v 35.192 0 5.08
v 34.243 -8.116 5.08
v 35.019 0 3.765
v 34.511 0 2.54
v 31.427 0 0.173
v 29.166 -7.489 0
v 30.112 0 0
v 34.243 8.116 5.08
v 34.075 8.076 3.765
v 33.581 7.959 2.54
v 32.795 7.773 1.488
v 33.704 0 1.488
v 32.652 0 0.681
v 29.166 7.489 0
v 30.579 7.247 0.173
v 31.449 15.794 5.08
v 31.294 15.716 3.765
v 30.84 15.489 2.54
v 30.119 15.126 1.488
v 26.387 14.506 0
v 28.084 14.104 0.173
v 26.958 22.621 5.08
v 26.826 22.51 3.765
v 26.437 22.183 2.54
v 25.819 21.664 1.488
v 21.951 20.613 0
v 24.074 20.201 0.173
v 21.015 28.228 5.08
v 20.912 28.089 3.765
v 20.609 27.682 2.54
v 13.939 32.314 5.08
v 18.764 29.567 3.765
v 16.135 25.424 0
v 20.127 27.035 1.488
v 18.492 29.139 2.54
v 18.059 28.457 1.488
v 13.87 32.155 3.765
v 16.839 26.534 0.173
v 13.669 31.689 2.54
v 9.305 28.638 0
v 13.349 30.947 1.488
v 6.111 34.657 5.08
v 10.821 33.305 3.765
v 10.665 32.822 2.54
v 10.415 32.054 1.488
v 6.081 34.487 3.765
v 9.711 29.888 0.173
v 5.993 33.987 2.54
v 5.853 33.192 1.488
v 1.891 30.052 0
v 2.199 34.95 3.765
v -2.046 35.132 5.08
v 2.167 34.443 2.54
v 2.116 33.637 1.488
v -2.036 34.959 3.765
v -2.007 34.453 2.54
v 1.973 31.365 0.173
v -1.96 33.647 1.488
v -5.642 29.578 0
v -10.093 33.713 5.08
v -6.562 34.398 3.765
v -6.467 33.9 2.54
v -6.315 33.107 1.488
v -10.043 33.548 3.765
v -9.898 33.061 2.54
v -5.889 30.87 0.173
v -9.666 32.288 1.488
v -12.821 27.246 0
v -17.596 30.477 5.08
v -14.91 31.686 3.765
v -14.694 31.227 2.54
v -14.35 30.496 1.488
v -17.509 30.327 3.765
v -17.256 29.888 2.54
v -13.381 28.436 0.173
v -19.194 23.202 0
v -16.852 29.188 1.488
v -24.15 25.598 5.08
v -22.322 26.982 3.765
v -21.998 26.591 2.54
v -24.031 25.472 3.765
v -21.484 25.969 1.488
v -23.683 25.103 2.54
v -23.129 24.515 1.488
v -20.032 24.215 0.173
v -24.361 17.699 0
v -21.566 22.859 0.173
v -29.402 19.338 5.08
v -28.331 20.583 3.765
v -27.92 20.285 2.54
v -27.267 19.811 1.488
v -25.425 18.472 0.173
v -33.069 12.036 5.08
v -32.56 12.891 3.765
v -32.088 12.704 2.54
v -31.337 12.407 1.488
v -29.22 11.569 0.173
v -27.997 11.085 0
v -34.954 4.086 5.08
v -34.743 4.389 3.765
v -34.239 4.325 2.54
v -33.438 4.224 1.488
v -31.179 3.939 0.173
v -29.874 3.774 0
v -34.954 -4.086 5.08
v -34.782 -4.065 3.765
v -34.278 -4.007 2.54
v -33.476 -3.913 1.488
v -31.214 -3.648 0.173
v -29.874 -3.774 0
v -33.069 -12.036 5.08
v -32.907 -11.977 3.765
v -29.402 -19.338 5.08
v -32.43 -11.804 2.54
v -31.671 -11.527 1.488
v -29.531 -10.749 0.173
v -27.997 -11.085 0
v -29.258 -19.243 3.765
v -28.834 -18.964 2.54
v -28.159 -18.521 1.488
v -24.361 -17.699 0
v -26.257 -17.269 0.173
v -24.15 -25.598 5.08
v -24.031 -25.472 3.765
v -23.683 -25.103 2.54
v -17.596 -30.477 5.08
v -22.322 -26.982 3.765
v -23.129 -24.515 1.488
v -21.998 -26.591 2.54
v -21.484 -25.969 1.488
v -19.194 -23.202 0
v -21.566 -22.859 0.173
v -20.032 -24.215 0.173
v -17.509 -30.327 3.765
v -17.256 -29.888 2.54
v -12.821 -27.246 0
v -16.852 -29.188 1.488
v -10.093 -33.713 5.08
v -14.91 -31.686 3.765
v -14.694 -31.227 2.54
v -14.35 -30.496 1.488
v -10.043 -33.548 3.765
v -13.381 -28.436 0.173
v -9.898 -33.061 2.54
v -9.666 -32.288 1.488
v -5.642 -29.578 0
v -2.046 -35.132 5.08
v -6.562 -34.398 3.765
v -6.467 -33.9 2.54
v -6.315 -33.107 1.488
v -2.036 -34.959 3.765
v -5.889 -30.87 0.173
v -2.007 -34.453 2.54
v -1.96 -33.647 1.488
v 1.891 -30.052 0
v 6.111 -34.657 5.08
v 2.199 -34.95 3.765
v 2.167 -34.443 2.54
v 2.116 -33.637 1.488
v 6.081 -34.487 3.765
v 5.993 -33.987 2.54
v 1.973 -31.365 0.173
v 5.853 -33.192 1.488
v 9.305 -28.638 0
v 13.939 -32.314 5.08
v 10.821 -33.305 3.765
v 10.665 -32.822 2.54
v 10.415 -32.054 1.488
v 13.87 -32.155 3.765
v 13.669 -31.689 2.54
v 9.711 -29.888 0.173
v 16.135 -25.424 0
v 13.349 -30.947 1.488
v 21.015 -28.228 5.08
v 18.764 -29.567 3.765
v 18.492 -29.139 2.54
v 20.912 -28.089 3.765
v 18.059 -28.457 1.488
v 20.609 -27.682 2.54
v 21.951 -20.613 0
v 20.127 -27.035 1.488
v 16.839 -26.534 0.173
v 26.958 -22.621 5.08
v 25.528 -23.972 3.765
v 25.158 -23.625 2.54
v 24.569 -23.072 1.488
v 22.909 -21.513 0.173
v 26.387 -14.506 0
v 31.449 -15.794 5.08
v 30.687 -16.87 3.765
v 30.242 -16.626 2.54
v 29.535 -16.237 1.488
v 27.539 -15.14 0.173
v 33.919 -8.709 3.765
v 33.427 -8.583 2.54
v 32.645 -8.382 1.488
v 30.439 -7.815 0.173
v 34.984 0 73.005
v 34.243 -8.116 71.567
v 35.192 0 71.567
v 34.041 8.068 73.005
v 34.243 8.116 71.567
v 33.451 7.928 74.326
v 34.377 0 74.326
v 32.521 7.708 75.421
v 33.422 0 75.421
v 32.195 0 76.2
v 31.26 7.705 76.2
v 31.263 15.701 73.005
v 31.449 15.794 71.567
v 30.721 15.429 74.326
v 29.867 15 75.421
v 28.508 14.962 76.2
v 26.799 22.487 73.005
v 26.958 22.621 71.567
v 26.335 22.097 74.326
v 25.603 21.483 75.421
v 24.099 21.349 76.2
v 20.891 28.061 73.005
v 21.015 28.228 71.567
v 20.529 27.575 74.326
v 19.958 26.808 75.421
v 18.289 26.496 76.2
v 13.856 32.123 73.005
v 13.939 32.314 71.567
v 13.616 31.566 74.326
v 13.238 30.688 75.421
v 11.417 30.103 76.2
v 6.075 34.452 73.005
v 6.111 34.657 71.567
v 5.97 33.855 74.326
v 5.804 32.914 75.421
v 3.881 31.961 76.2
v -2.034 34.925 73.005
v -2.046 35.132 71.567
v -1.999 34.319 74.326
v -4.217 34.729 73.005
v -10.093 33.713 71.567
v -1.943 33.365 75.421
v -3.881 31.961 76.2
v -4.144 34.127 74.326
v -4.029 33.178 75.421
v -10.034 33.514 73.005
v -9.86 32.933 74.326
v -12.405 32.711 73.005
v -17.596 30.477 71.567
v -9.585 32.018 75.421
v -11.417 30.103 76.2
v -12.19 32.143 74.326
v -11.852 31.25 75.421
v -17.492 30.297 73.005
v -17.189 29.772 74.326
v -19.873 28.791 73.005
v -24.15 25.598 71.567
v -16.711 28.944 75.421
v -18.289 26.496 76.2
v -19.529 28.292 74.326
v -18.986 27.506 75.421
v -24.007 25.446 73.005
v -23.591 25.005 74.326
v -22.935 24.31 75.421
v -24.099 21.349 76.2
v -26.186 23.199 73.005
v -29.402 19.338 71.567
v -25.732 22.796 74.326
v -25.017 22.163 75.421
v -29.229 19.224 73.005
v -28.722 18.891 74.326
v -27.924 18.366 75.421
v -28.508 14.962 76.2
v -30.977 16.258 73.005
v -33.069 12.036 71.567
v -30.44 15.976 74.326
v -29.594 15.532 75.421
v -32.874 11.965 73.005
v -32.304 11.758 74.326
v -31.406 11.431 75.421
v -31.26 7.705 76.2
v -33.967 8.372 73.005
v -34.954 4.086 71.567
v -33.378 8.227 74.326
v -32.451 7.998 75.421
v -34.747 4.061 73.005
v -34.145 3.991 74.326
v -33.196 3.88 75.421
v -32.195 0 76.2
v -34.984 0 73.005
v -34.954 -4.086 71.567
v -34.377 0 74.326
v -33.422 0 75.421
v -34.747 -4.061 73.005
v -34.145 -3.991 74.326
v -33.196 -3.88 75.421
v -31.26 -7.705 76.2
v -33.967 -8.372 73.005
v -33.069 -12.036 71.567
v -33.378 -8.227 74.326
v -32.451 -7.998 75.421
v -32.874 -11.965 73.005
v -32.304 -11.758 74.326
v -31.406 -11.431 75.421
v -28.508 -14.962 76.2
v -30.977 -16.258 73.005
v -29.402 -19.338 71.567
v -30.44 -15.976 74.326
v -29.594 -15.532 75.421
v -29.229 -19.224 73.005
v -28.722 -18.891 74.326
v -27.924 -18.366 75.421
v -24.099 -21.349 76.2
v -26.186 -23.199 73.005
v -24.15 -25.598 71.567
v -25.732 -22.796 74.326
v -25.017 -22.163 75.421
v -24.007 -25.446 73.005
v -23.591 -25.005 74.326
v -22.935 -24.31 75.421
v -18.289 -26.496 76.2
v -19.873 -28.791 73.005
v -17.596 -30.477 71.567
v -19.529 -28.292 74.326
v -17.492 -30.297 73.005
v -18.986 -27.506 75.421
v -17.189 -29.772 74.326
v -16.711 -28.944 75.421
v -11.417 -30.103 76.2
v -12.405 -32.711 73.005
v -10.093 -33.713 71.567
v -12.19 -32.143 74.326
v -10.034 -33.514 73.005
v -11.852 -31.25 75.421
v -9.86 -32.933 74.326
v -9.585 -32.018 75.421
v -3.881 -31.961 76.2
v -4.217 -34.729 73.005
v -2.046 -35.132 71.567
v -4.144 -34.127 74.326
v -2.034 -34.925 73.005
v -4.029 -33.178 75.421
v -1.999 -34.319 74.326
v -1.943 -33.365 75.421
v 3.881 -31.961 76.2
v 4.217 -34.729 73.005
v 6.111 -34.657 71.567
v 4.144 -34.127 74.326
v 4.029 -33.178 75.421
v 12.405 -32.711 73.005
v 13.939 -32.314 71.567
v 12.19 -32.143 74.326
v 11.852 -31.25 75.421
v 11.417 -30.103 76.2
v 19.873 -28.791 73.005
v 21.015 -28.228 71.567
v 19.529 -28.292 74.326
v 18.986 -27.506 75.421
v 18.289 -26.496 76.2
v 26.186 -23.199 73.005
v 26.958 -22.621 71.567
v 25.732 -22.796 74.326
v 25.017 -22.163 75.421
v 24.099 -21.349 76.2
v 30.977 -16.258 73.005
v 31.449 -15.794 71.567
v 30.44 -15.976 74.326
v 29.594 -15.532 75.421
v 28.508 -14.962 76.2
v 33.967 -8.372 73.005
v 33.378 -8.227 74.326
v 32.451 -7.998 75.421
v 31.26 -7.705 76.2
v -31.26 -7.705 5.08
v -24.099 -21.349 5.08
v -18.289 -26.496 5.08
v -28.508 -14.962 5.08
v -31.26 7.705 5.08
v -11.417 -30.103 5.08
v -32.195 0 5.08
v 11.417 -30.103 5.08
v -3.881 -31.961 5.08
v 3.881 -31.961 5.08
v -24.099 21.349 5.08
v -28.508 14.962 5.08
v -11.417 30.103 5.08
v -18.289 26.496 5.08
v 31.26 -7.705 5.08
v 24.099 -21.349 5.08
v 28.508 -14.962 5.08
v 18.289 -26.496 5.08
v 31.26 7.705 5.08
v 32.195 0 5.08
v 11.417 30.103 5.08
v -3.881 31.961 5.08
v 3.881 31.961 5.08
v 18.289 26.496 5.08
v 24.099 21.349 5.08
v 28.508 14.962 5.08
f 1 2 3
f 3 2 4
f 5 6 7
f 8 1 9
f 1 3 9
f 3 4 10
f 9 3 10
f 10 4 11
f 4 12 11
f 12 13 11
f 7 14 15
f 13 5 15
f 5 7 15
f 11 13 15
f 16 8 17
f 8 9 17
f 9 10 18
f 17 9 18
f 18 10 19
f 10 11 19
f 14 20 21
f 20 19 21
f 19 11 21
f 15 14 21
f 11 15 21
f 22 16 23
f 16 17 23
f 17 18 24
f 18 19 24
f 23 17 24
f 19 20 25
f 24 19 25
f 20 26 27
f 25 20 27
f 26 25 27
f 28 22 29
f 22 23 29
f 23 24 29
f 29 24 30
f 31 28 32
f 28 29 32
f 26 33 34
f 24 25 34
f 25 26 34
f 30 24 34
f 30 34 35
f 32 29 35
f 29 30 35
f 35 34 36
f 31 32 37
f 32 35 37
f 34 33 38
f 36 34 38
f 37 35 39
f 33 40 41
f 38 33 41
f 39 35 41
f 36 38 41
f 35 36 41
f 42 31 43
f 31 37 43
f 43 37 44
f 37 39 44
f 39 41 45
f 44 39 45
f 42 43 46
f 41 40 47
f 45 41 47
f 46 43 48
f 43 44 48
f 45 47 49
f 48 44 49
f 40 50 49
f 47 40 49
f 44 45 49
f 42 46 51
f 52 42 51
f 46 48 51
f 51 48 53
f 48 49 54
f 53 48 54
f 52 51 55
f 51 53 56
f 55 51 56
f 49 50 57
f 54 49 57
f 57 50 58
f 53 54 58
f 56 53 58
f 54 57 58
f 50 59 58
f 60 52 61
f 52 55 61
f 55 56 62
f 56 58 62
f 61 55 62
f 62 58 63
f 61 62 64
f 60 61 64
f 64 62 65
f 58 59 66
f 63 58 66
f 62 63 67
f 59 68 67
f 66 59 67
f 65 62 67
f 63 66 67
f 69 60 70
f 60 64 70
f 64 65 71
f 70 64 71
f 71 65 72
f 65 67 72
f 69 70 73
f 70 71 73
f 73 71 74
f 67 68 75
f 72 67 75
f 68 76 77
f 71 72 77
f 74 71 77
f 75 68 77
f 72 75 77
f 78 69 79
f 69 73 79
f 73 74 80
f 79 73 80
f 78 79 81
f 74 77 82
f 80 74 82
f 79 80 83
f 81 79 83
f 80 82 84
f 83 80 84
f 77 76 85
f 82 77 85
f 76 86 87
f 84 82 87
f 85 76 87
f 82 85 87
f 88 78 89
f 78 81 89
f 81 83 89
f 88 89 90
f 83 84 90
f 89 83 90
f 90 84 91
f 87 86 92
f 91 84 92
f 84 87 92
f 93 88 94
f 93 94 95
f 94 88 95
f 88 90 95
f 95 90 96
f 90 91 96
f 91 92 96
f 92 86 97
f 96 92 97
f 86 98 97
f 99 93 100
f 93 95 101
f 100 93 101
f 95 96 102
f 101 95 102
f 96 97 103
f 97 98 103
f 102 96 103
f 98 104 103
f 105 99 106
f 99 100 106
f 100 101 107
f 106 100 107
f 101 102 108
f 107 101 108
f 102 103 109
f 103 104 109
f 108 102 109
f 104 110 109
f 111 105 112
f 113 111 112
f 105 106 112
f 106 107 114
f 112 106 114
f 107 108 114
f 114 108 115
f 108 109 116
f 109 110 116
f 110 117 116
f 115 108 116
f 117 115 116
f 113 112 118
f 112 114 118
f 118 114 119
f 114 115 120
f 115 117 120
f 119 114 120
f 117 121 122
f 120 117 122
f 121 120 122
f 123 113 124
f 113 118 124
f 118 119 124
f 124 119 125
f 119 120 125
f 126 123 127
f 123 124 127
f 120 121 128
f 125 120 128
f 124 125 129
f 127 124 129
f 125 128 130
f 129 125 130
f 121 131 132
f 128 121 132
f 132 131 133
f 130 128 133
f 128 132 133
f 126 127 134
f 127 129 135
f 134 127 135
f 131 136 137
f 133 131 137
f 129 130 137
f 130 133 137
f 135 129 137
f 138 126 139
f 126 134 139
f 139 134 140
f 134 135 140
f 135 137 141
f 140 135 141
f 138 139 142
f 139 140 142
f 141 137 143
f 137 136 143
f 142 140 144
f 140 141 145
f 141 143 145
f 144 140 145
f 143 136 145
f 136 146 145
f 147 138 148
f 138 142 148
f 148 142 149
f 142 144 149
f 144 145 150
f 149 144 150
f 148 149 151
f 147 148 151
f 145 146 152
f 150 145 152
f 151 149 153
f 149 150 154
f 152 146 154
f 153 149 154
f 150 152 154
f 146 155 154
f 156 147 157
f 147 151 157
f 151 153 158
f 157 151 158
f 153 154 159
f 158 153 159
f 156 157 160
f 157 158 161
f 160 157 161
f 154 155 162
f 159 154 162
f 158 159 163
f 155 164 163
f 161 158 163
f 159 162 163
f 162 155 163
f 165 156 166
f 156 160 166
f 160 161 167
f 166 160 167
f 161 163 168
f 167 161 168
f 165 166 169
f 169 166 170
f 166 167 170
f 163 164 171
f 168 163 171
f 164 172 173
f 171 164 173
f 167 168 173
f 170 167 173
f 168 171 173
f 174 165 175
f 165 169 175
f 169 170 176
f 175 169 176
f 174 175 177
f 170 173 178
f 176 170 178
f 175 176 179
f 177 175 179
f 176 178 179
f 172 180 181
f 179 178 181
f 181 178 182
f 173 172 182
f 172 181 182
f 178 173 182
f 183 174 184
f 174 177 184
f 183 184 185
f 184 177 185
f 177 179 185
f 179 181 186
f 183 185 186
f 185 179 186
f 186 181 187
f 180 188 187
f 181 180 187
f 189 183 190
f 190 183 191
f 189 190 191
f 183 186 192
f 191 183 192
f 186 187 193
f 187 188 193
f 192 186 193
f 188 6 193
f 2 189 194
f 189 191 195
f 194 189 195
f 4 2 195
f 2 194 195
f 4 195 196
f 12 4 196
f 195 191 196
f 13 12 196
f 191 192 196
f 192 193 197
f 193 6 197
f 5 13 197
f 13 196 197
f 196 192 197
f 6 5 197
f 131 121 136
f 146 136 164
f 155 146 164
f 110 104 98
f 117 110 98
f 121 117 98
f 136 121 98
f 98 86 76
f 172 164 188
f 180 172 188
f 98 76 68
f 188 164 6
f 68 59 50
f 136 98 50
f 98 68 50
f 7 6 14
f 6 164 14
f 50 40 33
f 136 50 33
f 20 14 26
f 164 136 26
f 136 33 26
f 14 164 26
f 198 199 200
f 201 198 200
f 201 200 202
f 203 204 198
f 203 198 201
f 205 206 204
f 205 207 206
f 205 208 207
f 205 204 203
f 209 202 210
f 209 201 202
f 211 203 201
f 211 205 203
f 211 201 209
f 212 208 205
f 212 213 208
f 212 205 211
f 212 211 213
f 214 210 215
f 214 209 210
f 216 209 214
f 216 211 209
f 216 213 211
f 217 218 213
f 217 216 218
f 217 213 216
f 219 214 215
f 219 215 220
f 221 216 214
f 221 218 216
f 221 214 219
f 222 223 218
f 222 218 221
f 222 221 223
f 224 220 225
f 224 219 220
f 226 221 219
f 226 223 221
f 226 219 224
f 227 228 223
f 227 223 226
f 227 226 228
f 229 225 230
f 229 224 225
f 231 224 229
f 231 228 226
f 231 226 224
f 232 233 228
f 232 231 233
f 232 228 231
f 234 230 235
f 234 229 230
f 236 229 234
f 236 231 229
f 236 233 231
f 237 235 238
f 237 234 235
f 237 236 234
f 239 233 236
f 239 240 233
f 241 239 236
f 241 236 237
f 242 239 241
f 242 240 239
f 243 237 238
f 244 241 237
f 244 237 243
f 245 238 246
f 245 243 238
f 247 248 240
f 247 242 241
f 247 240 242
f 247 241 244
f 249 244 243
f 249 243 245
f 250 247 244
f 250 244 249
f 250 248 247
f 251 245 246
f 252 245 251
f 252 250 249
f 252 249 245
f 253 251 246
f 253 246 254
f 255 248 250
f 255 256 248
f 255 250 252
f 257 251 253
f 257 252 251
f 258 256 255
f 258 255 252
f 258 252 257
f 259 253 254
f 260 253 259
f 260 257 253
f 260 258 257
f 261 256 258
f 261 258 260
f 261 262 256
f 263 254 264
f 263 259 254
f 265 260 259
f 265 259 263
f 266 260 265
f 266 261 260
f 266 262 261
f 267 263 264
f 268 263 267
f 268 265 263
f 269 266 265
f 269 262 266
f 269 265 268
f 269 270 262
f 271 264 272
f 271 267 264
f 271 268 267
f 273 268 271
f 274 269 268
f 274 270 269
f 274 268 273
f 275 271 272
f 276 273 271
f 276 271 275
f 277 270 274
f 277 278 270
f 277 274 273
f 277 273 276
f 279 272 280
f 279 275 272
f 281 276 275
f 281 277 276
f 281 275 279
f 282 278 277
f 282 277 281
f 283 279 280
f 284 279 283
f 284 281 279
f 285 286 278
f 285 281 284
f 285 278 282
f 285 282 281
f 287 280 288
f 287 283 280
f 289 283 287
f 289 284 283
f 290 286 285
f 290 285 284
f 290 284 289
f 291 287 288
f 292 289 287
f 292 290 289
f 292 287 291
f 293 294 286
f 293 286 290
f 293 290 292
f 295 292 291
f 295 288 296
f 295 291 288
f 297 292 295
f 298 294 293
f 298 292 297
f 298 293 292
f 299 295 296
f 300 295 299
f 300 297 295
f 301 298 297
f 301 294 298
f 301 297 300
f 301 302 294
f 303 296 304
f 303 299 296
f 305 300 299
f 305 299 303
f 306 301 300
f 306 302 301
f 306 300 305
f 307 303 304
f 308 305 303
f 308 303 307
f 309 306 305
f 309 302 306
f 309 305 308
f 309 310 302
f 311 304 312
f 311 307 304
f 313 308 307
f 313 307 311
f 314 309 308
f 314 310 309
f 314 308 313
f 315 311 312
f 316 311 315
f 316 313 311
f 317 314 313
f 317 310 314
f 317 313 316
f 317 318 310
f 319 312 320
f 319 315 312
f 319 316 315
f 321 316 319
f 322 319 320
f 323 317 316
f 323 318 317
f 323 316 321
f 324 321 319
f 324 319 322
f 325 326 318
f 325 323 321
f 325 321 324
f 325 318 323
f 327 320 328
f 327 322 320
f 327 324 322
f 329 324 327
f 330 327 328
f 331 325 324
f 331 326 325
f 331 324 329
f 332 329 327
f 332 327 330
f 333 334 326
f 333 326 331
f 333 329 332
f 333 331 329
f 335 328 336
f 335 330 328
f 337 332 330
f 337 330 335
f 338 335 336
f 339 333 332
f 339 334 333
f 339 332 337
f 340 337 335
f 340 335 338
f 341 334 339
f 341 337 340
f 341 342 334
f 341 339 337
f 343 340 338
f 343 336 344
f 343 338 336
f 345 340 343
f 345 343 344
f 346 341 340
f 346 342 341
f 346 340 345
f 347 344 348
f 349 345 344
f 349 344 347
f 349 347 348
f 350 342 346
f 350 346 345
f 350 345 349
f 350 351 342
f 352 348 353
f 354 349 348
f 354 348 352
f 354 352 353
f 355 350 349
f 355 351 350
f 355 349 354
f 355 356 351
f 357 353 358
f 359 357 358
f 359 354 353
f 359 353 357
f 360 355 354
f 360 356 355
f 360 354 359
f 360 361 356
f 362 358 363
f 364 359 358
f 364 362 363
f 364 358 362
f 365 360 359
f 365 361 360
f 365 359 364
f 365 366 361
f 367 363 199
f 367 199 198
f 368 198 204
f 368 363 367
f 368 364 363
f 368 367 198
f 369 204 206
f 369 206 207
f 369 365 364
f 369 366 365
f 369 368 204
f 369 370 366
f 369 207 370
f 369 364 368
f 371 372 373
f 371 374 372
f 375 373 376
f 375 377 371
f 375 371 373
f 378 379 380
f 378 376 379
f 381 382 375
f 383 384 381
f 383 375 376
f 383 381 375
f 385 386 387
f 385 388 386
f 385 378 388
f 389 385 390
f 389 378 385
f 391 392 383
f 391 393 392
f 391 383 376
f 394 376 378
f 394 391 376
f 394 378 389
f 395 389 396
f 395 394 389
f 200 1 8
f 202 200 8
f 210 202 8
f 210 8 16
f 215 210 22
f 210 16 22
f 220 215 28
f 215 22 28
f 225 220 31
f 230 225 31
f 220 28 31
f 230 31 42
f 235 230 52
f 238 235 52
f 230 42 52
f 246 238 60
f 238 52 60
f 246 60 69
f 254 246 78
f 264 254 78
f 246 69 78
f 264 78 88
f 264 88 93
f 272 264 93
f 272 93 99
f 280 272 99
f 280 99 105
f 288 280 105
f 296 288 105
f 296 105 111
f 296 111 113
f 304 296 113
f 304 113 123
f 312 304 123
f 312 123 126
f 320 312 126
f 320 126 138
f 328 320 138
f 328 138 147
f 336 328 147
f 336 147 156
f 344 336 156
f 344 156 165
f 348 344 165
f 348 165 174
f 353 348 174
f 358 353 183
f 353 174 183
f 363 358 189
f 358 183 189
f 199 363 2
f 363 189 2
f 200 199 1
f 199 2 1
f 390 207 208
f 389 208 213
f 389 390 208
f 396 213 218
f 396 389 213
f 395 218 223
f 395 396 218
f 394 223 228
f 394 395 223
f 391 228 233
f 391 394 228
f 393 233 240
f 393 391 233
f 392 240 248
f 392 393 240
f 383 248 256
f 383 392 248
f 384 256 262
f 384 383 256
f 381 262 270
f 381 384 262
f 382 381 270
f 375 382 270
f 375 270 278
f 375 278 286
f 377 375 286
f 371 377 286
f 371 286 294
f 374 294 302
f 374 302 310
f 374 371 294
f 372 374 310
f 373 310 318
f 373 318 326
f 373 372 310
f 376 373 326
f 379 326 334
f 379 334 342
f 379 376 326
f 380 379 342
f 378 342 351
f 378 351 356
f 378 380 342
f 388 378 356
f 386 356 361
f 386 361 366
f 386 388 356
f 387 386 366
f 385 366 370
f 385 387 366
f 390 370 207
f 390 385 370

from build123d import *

# Parameters (mm, degrees)
F0_R     = 35.1918039157
F0_R_2   = 32.1953483685
F1_DEPTH = 76.2
F2_R     = 32.3619663376
F3_DEPTH = 25.4
F4_DEPTH = 20.32


# Not quite as in the source:
# - a fillet or chamfer that OpenCascade refuses, or shapes differently, is made with other operations: its cross-section is extruded or revolved along the edge and cut away or added


with BuildPart() as f1:
    # F0 (on Top) → F1 (new body)
    with BuildSketch(Plane.XY):
        Circle(F0_R)
        Circle(F0_R_2, mode=Mode.SUBTRACT)
    extrude(amount=F1_DEPTH)

    # F2 (on Top) → F3 (join)
    with BuildSketch(Plane.XY):
        Circle(F2_R)
    extrude(amount=F3_DEPTH)

    # F4 (cut): a face of the model
    f4_faces = [f1.faces().sort_by_distance(p)[0] for p in [
        (0, 0, 25.4),
    ]]
    extrude(f4_faces, amount=-F4_DEPTH, mode=Mode.SUBTRACT)

    # F5: fillet of radius 5.08 on 2 edges, made by hand

    # F5_s1 → F5_t2 (revolve, cut)
    with BuildSketch(Plane.XZ):
        with BuildLine():
            ThreePointArc((35.1918039157, 71.5669402644), (34.377410896, 74.3257438258), (32.1953483685, 76.2))
            Line((32.1953483685, 76.2), (32.2370192575, 76.2926611947))
            ThreePointArc((32.2370192575, 76.2926611947), (33.6935761421, 76.3016), (35.1918039157, 76.3016))
            Line((35.1918039157, 76.3016), (35.2934039157, 76.2))
            Line((35.2934039157, 76.2), (35.2934039157, 71.5669402644))
            Line((35.2934039157, 71.5669402644), (35.1918039157, 71.5669402644))
        make_face()
    revolve(axis=Axis((0, 0, 76.2), (0, 0, 1)), mode=Mode.SUBTRACT)

    # F5_s3 → F5_t4 (revolve, cut)
    with BuildSketch(Plane.XZ):
        with BuildLine():
            ThreePointArc((35.1918039157, 5.08), (33.7039063642, 1.4878975516), (30.1118039157, 0))
            Line((30.1118039157, 0), (30.1118039157, -0.1016))
            Line((30.1118039157, -0.1016), (35.2934039157, -0.1016))
            Line((35.2934039157, -0.1016), (35.2934039157, 5.08))
            Line((35.2934039157, 5.08), (35.1918039157, 5.08))
        make_face()
    revolve(axis=Axis((0, 0, 0), (0, 0, 1)), mode=Mode.SUBTRACT)


solid = f1.part
